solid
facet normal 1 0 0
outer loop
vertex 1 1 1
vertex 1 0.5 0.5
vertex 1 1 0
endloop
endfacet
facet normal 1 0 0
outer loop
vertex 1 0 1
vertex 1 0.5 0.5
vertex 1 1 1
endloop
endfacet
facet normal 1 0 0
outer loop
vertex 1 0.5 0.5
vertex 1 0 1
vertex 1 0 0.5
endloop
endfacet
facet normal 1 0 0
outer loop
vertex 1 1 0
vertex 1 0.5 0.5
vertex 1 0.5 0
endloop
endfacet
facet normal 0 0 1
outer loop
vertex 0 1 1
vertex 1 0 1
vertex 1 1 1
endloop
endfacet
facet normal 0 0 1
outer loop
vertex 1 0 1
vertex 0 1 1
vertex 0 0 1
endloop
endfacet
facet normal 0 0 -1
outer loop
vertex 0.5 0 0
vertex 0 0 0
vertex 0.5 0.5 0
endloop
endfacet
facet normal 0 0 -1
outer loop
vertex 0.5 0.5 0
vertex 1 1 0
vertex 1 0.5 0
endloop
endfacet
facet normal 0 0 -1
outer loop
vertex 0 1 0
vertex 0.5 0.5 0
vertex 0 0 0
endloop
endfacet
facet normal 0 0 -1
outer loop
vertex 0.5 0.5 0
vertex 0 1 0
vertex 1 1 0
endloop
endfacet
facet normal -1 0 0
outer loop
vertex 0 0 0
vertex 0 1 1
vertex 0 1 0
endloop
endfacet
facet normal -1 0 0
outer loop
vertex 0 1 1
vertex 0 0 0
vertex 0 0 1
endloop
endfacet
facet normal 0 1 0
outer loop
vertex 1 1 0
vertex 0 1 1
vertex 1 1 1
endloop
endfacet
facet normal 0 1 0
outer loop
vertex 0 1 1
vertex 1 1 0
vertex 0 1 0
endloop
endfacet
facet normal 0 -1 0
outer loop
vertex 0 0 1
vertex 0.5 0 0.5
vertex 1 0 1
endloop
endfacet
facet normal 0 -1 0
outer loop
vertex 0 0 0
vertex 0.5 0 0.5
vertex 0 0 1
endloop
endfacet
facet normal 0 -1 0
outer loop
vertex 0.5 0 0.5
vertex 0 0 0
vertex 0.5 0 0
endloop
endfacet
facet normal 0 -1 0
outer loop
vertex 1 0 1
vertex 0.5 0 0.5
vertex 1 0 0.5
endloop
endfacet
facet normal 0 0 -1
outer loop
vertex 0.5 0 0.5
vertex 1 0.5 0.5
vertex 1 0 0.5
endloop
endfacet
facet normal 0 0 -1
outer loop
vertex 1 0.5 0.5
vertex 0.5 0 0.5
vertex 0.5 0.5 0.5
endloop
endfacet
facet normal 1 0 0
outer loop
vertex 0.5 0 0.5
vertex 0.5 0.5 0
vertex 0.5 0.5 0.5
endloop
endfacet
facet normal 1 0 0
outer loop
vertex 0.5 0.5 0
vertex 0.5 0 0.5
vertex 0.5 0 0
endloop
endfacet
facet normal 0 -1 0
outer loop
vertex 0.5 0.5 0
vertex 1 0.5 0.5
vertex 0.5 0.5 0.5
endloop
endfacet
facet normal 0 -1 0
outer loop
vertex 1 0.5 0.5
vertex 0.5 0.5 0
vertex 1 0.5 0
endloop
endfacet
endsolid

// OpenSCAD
difference() {
   cube();
   translate([0.5,0,0]) scale(0.5) cube();
}
